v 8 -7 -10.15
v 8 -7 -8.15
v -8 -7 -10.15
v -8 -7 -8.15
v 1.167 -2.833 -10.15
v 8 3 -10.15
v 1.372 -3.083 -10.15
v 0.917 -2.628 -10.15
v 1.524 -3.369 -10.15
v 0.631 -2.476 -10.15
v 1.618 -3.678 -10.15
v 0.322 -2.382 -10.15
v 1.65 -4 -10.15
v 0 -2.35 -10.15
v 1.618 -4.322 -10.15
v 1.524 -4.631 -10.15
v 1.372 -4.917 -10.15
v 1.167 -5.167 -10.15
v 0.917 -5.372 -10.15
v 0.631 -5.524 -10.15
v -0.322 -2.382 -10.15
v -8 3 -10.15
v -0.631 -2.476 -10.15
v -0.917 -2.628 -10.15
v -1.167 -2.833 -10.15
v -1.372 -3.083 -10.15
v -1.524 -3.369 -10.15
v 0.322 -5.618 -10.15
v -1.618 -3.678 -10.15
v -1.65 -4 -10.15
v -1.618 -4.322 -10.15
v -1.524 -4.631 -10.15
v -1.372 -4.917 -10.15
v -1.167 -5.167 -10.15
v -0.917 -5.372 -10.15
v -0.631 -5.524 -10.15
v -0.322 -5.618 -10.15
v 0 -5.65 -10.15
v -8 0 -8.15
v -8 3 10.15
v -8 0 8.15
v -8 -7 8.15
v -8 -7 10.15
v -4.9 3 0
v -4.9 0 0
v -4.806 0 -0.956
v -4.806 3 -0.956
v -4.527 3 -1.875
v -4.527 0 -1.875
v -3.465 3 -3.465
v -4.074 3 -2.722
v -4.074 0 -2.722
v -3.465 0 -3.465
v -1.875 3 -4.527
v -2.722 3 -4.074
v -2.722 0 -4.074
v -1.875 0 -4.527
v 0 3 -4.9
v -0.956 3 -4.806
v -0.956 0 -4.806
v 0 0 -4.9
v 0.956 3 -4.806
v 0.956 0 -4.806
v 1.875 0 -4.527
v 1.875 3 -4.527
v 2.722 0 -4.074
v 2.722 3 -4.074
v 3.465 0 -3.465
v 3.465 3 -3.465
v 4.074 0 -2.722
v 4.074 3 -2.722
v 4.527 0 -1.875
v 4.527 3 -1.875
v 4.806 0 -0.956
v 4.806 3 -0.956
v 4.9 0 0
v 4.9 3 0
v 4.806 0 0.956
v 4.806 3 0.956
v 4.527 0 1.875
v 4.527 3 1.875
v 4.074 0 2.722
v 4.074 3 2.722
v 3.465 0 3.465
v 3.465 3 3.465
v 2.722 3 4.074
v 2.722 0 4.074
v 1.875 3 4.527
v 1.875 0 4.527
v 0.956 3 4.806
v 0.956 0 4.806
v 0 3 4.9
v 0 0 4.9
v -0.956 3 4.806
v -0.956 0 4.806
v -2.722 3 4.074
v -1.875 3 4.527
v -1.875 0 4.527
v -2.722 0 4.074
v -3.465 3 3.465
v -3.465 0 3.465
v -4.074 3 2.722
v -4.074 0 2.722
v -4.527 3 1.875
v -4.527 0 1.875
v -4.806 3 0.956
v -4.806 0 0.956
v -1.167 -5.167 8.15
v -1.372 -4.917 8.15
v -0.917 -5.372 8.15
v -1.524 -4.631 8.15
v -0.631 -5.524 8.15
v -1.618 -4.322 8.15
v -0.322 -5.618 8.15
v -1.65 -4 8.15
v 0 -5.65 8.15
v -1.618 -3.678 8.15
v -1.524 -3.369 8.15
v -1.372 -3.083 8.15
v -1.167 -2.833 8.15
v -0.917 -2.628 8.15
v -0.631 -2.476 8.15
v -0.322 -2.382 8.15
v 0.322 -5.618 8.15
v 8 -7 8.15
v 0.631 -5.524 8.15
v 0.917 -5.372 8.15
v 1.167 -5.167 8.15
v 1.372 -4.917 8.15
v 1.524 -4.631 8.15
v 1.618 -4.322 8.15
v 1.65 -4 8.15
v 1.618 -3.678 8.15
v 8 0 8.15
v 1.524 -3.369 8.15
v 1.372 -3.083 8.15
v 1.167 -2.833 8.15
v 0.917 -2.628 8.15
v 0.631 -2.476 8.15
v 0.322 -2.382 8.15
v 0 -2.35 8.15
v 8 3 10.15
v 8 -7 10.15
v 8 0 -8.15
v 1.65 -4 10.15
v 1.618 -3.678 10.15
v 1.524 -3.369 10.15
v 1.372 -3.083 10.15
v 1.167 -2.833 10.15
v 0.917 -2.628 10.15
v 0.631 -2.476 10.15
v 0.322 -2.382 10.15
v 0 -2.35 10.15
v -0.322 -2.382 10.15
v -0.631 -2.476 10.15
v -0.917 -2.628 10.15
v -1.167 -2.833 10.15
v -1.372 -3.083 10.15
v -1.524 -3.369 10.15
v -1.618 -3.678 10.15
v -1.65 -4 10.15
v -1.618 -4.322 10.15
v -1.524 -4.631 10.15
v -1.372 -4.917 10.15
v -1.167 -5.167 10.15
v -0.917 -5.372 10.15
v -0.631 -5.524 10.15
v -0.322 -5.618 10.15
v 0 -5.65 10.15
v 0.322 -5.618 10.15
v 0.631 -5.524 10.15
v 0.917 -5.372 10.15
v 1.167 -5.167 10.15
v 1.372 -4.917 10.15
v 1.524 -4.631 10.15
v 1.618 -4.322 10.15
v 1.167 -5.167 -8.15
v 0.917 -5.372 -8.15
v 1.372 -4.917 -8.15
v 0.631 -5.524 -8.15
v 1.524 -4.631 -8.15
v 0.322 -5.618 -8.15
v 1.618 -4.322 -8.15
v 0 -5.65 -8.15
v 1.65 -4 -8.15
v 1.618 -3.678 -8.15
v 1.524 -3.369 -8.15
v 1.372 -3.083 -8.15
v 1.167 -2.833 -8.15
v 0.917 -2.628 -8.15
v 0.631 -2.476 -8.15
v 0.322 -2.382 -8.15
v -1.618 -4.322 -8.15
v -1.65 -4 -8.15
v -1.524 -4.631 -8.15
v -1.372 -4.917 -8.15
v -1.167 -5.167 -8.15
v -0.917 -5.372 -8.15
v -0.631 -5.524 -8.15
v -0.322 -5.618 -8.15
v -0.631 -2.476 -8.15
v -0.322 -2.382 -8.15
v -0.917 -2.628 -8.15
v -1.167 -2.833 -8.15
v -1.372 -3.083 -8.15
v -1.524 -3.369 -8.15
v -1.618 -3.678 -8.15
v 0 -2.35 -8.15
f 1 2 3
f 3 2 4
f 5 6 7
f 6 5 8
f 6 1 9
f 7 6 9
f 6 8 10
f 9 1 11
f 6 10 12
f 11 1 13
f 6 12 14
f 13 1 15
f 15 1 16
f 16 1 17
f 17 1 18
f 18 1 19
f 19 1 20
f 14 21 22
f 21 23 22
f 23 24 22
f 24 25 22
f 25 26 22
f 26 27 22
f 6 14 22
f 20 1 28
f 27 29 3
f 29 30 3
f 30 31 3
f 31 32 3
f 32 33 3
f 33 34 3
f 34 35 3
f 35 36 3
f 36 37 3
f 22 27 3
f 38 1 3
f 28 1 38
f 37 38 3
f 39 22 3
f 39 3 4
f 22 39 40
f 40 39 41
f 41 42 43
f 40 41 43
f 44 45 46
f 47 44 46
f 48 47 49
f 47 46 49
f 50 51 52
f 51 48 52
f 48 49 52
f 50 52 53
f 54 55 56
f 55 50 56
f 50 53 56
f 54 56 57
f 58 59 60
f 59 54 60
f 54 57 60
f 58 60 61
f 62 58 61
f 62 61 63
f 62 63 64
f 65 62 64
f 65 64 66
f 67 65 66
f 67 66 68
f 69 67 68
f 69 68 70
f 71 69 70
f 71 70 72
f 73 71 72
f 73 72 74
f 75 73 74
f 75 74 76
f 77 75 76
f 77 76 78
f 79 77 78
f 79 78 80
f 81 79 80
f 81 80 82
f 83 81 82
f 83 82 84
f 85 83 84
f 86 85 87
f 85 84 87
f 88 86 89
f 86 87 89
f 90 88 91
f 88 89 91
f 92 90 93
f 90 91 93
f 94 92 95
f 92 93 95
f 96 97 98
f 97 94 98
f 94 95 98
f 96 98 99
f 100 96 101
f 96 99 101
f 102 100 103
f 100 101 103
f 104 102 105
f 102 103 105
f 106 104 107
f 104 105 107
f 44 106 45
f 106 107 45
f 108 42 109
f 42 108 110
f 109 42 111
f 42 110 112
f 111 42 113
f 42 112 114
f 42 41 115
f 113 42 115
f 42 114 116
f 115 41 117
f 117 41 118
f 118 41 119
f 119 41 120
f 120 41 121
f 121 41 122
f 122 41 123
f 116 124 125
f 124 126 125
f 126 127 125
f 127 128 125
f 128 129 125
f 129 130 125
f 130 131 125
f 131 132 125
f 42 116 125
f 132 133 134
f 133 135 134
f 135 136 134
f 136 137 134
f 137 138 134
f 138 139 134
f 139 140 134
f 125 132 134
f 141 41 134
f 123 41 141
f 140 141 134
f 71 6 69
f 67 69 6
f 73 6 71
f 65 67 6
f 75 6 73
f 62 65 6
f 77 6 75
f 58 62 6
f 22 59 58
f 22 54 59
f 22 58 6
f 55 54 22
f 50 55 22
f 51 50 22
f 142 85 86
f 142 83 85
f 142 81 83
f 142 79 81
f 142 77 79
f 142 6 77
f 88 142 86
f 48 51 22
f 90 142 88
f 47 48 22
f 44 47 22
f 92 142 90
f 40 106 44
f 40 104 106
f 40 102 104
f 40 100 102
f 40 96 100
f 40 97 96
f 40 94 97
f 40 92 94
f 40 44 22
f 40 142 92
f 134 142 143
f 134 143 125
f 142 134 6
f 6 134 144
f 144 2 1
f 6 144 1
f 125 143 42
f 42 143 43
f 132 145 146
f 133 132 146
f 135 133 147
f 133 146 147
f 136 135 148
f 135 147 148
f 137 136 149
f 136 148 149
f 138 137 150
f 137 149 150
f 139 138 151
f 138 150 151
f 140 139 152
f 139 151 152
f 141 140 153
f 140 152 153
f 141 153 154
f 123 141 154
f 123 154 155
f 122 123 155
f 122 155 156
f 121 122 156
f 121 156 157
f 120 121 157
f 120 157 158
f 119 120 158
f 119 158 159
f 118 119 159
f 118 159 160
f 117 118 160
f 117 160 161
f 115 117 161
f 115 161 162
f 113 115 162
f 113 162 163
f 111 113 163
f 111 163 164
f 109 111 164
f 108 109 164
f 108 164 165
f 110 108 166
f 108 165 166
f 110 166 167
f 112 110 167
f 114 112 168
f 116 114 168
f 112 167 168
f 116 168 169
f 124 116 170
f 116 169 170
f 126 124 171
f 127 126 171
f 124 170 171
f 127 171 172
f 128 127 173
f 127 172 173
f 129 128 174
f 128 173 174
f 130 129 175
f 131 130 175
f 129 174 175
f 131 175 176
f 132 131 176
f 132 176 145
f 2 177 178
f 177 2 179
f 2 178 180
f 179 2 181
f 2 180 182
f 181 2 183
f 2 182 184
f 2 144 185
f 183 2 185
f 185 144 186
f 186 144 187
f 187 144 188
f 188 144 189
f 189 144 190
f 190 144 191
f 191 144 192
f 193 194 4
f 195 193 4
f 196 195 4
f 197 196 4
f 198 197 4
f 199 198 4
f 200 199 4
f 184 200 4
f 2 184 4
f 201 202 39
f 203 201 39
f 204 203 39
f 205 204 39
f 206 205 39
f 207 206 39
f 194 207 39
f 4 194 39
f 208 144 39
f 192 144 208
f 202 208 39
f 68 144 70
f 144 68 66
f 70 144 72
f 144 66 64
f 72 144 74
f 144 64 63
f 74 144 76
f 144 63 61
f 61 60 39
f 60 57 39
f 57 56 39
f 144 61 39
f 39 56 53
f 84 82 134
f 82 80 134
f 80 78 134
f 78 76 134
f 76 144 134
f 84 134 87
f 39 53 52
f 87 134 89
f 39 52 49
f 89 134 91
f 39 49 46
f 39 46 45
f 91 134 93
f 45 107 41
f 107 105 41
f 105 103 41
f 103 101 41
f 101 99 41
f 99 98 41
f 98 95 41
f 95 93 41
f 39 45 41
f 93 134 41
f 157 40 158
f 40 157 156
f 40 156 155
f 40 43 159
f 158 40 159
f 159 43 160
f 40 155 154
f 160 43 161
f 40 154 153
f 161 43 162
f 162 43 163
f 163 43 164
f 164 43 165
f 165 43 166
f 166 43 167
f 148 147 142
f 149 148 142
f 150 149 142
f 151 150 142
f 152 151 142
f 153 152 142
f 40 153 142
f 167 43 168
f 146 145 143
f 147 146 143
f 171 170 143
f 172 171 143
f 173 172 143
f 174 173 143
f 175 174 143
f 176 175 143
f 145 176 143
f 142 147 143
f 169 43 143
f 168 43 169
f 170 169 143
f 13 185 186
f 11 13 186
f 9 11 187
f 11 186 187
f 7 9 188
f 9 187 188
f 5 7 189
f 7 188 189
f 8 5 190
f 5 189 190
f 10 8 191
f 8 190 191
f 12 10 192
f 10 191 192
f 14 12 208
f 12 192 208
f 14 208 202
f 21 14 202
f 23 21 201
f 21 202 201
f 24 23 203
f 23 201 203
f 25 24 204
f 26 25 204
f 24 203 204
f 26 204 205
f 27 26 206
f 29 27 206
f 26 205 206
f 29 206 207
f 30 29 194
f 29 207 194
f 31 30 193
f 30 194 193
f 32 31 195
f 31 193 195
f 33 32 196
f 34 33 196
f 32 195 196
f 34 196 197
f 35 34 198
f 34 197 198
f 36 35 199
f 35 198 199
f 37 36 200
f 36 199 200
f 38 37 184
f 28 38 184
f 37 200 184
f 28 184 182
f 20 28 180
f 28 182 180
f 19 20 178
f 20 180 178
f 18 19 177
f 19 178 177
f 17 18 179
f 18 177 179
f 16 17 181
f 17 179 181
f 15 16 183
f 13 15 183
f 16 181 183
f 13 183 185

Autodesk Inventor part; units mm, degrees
ref_plane "YZ Plane" through (0, 0, 0) normal (1, 0, 0) x (0, 1, 0)
ref_plane "XZ Plane" through (0, 0, 0) normal (0, 1, 0) x (-1, 0, 0)
ref_plane "XY Plane" through (0, 0, 0) normal (0, 0, 1) x (1, 0, 0)
sketch "Sketch1" plane through (0, 0, 0) normal (0, 1, 0) x (-1, 0, 0)
  circle A0 centre (0, 0) radius 4.9
  circle A1 centre (0, 0) radius 6.9
  line L0 (6.9, 8) -> (-5.9499, 8) construction
  line L1 (6.9, -8) -> (-5.9499, -8) construction
  line L2 (8, 8.15) -> (-8, 8.15)
  line L3 (-8, 8.15) -> (-8, -8.15)
  line L4 (-8, -8.15) -> (8, -8.15)
  line L5 (8, -8.15) -> (8, 8.15)
  line L6 (8, 8.15) -> (8, 10.15)
  line L7 (8, 10.15) -> (-8, 10.15)
  line L8 (-8, 10.15) -> (-8, 8.15)
  line L9 (-8, -8.15) -> (-8, -10.15)
  line L10 (-8, -10.15) -> (8, -10.15)
  line L11 (8, -10.15) -> (8, -8.15)
  point P0 (0, -8.15)
  dimension "d0" = 9.8
  dimension "d1" = 2
  dimension "d2" = 16
  dimension "d3" = 8
  dimension "d4" = 0.15
  dimension "d5" = 0.15
  dimension "d6" = 16
  dimension "d7" = 2
  dimension "d8" = 2
extrude "Extrusion1" add sketch "Sketch1" along normal blind 3 contours A1 | L5 L4 L3 L2 | L2 L8 L7 L6 | L11 L10 L9 L4
extrude "Extrusion2" add sketch "Sketch1" against normal blind 7 contours L2 L8 L7 L6 | L11 L10 L9 L4
sketch "Sketch2" plane through (-8, 3, 10.15) normal (0, 0, 1) x (1, 0, 0)
  circle A0 centre (8, -7) radius 1.65
  line L0 (16, -10) -> (0, -10) projected
  point P0 (8, -3)
  point P1 (8, -10)
  dimension "d13" = 3.3
  dimension "d14" = 3
extrude "Extrusion3" cut sketch "Sketch2" against normal through all
properties part number "ShaftSyncAdapter" material "ABS Plastic"
